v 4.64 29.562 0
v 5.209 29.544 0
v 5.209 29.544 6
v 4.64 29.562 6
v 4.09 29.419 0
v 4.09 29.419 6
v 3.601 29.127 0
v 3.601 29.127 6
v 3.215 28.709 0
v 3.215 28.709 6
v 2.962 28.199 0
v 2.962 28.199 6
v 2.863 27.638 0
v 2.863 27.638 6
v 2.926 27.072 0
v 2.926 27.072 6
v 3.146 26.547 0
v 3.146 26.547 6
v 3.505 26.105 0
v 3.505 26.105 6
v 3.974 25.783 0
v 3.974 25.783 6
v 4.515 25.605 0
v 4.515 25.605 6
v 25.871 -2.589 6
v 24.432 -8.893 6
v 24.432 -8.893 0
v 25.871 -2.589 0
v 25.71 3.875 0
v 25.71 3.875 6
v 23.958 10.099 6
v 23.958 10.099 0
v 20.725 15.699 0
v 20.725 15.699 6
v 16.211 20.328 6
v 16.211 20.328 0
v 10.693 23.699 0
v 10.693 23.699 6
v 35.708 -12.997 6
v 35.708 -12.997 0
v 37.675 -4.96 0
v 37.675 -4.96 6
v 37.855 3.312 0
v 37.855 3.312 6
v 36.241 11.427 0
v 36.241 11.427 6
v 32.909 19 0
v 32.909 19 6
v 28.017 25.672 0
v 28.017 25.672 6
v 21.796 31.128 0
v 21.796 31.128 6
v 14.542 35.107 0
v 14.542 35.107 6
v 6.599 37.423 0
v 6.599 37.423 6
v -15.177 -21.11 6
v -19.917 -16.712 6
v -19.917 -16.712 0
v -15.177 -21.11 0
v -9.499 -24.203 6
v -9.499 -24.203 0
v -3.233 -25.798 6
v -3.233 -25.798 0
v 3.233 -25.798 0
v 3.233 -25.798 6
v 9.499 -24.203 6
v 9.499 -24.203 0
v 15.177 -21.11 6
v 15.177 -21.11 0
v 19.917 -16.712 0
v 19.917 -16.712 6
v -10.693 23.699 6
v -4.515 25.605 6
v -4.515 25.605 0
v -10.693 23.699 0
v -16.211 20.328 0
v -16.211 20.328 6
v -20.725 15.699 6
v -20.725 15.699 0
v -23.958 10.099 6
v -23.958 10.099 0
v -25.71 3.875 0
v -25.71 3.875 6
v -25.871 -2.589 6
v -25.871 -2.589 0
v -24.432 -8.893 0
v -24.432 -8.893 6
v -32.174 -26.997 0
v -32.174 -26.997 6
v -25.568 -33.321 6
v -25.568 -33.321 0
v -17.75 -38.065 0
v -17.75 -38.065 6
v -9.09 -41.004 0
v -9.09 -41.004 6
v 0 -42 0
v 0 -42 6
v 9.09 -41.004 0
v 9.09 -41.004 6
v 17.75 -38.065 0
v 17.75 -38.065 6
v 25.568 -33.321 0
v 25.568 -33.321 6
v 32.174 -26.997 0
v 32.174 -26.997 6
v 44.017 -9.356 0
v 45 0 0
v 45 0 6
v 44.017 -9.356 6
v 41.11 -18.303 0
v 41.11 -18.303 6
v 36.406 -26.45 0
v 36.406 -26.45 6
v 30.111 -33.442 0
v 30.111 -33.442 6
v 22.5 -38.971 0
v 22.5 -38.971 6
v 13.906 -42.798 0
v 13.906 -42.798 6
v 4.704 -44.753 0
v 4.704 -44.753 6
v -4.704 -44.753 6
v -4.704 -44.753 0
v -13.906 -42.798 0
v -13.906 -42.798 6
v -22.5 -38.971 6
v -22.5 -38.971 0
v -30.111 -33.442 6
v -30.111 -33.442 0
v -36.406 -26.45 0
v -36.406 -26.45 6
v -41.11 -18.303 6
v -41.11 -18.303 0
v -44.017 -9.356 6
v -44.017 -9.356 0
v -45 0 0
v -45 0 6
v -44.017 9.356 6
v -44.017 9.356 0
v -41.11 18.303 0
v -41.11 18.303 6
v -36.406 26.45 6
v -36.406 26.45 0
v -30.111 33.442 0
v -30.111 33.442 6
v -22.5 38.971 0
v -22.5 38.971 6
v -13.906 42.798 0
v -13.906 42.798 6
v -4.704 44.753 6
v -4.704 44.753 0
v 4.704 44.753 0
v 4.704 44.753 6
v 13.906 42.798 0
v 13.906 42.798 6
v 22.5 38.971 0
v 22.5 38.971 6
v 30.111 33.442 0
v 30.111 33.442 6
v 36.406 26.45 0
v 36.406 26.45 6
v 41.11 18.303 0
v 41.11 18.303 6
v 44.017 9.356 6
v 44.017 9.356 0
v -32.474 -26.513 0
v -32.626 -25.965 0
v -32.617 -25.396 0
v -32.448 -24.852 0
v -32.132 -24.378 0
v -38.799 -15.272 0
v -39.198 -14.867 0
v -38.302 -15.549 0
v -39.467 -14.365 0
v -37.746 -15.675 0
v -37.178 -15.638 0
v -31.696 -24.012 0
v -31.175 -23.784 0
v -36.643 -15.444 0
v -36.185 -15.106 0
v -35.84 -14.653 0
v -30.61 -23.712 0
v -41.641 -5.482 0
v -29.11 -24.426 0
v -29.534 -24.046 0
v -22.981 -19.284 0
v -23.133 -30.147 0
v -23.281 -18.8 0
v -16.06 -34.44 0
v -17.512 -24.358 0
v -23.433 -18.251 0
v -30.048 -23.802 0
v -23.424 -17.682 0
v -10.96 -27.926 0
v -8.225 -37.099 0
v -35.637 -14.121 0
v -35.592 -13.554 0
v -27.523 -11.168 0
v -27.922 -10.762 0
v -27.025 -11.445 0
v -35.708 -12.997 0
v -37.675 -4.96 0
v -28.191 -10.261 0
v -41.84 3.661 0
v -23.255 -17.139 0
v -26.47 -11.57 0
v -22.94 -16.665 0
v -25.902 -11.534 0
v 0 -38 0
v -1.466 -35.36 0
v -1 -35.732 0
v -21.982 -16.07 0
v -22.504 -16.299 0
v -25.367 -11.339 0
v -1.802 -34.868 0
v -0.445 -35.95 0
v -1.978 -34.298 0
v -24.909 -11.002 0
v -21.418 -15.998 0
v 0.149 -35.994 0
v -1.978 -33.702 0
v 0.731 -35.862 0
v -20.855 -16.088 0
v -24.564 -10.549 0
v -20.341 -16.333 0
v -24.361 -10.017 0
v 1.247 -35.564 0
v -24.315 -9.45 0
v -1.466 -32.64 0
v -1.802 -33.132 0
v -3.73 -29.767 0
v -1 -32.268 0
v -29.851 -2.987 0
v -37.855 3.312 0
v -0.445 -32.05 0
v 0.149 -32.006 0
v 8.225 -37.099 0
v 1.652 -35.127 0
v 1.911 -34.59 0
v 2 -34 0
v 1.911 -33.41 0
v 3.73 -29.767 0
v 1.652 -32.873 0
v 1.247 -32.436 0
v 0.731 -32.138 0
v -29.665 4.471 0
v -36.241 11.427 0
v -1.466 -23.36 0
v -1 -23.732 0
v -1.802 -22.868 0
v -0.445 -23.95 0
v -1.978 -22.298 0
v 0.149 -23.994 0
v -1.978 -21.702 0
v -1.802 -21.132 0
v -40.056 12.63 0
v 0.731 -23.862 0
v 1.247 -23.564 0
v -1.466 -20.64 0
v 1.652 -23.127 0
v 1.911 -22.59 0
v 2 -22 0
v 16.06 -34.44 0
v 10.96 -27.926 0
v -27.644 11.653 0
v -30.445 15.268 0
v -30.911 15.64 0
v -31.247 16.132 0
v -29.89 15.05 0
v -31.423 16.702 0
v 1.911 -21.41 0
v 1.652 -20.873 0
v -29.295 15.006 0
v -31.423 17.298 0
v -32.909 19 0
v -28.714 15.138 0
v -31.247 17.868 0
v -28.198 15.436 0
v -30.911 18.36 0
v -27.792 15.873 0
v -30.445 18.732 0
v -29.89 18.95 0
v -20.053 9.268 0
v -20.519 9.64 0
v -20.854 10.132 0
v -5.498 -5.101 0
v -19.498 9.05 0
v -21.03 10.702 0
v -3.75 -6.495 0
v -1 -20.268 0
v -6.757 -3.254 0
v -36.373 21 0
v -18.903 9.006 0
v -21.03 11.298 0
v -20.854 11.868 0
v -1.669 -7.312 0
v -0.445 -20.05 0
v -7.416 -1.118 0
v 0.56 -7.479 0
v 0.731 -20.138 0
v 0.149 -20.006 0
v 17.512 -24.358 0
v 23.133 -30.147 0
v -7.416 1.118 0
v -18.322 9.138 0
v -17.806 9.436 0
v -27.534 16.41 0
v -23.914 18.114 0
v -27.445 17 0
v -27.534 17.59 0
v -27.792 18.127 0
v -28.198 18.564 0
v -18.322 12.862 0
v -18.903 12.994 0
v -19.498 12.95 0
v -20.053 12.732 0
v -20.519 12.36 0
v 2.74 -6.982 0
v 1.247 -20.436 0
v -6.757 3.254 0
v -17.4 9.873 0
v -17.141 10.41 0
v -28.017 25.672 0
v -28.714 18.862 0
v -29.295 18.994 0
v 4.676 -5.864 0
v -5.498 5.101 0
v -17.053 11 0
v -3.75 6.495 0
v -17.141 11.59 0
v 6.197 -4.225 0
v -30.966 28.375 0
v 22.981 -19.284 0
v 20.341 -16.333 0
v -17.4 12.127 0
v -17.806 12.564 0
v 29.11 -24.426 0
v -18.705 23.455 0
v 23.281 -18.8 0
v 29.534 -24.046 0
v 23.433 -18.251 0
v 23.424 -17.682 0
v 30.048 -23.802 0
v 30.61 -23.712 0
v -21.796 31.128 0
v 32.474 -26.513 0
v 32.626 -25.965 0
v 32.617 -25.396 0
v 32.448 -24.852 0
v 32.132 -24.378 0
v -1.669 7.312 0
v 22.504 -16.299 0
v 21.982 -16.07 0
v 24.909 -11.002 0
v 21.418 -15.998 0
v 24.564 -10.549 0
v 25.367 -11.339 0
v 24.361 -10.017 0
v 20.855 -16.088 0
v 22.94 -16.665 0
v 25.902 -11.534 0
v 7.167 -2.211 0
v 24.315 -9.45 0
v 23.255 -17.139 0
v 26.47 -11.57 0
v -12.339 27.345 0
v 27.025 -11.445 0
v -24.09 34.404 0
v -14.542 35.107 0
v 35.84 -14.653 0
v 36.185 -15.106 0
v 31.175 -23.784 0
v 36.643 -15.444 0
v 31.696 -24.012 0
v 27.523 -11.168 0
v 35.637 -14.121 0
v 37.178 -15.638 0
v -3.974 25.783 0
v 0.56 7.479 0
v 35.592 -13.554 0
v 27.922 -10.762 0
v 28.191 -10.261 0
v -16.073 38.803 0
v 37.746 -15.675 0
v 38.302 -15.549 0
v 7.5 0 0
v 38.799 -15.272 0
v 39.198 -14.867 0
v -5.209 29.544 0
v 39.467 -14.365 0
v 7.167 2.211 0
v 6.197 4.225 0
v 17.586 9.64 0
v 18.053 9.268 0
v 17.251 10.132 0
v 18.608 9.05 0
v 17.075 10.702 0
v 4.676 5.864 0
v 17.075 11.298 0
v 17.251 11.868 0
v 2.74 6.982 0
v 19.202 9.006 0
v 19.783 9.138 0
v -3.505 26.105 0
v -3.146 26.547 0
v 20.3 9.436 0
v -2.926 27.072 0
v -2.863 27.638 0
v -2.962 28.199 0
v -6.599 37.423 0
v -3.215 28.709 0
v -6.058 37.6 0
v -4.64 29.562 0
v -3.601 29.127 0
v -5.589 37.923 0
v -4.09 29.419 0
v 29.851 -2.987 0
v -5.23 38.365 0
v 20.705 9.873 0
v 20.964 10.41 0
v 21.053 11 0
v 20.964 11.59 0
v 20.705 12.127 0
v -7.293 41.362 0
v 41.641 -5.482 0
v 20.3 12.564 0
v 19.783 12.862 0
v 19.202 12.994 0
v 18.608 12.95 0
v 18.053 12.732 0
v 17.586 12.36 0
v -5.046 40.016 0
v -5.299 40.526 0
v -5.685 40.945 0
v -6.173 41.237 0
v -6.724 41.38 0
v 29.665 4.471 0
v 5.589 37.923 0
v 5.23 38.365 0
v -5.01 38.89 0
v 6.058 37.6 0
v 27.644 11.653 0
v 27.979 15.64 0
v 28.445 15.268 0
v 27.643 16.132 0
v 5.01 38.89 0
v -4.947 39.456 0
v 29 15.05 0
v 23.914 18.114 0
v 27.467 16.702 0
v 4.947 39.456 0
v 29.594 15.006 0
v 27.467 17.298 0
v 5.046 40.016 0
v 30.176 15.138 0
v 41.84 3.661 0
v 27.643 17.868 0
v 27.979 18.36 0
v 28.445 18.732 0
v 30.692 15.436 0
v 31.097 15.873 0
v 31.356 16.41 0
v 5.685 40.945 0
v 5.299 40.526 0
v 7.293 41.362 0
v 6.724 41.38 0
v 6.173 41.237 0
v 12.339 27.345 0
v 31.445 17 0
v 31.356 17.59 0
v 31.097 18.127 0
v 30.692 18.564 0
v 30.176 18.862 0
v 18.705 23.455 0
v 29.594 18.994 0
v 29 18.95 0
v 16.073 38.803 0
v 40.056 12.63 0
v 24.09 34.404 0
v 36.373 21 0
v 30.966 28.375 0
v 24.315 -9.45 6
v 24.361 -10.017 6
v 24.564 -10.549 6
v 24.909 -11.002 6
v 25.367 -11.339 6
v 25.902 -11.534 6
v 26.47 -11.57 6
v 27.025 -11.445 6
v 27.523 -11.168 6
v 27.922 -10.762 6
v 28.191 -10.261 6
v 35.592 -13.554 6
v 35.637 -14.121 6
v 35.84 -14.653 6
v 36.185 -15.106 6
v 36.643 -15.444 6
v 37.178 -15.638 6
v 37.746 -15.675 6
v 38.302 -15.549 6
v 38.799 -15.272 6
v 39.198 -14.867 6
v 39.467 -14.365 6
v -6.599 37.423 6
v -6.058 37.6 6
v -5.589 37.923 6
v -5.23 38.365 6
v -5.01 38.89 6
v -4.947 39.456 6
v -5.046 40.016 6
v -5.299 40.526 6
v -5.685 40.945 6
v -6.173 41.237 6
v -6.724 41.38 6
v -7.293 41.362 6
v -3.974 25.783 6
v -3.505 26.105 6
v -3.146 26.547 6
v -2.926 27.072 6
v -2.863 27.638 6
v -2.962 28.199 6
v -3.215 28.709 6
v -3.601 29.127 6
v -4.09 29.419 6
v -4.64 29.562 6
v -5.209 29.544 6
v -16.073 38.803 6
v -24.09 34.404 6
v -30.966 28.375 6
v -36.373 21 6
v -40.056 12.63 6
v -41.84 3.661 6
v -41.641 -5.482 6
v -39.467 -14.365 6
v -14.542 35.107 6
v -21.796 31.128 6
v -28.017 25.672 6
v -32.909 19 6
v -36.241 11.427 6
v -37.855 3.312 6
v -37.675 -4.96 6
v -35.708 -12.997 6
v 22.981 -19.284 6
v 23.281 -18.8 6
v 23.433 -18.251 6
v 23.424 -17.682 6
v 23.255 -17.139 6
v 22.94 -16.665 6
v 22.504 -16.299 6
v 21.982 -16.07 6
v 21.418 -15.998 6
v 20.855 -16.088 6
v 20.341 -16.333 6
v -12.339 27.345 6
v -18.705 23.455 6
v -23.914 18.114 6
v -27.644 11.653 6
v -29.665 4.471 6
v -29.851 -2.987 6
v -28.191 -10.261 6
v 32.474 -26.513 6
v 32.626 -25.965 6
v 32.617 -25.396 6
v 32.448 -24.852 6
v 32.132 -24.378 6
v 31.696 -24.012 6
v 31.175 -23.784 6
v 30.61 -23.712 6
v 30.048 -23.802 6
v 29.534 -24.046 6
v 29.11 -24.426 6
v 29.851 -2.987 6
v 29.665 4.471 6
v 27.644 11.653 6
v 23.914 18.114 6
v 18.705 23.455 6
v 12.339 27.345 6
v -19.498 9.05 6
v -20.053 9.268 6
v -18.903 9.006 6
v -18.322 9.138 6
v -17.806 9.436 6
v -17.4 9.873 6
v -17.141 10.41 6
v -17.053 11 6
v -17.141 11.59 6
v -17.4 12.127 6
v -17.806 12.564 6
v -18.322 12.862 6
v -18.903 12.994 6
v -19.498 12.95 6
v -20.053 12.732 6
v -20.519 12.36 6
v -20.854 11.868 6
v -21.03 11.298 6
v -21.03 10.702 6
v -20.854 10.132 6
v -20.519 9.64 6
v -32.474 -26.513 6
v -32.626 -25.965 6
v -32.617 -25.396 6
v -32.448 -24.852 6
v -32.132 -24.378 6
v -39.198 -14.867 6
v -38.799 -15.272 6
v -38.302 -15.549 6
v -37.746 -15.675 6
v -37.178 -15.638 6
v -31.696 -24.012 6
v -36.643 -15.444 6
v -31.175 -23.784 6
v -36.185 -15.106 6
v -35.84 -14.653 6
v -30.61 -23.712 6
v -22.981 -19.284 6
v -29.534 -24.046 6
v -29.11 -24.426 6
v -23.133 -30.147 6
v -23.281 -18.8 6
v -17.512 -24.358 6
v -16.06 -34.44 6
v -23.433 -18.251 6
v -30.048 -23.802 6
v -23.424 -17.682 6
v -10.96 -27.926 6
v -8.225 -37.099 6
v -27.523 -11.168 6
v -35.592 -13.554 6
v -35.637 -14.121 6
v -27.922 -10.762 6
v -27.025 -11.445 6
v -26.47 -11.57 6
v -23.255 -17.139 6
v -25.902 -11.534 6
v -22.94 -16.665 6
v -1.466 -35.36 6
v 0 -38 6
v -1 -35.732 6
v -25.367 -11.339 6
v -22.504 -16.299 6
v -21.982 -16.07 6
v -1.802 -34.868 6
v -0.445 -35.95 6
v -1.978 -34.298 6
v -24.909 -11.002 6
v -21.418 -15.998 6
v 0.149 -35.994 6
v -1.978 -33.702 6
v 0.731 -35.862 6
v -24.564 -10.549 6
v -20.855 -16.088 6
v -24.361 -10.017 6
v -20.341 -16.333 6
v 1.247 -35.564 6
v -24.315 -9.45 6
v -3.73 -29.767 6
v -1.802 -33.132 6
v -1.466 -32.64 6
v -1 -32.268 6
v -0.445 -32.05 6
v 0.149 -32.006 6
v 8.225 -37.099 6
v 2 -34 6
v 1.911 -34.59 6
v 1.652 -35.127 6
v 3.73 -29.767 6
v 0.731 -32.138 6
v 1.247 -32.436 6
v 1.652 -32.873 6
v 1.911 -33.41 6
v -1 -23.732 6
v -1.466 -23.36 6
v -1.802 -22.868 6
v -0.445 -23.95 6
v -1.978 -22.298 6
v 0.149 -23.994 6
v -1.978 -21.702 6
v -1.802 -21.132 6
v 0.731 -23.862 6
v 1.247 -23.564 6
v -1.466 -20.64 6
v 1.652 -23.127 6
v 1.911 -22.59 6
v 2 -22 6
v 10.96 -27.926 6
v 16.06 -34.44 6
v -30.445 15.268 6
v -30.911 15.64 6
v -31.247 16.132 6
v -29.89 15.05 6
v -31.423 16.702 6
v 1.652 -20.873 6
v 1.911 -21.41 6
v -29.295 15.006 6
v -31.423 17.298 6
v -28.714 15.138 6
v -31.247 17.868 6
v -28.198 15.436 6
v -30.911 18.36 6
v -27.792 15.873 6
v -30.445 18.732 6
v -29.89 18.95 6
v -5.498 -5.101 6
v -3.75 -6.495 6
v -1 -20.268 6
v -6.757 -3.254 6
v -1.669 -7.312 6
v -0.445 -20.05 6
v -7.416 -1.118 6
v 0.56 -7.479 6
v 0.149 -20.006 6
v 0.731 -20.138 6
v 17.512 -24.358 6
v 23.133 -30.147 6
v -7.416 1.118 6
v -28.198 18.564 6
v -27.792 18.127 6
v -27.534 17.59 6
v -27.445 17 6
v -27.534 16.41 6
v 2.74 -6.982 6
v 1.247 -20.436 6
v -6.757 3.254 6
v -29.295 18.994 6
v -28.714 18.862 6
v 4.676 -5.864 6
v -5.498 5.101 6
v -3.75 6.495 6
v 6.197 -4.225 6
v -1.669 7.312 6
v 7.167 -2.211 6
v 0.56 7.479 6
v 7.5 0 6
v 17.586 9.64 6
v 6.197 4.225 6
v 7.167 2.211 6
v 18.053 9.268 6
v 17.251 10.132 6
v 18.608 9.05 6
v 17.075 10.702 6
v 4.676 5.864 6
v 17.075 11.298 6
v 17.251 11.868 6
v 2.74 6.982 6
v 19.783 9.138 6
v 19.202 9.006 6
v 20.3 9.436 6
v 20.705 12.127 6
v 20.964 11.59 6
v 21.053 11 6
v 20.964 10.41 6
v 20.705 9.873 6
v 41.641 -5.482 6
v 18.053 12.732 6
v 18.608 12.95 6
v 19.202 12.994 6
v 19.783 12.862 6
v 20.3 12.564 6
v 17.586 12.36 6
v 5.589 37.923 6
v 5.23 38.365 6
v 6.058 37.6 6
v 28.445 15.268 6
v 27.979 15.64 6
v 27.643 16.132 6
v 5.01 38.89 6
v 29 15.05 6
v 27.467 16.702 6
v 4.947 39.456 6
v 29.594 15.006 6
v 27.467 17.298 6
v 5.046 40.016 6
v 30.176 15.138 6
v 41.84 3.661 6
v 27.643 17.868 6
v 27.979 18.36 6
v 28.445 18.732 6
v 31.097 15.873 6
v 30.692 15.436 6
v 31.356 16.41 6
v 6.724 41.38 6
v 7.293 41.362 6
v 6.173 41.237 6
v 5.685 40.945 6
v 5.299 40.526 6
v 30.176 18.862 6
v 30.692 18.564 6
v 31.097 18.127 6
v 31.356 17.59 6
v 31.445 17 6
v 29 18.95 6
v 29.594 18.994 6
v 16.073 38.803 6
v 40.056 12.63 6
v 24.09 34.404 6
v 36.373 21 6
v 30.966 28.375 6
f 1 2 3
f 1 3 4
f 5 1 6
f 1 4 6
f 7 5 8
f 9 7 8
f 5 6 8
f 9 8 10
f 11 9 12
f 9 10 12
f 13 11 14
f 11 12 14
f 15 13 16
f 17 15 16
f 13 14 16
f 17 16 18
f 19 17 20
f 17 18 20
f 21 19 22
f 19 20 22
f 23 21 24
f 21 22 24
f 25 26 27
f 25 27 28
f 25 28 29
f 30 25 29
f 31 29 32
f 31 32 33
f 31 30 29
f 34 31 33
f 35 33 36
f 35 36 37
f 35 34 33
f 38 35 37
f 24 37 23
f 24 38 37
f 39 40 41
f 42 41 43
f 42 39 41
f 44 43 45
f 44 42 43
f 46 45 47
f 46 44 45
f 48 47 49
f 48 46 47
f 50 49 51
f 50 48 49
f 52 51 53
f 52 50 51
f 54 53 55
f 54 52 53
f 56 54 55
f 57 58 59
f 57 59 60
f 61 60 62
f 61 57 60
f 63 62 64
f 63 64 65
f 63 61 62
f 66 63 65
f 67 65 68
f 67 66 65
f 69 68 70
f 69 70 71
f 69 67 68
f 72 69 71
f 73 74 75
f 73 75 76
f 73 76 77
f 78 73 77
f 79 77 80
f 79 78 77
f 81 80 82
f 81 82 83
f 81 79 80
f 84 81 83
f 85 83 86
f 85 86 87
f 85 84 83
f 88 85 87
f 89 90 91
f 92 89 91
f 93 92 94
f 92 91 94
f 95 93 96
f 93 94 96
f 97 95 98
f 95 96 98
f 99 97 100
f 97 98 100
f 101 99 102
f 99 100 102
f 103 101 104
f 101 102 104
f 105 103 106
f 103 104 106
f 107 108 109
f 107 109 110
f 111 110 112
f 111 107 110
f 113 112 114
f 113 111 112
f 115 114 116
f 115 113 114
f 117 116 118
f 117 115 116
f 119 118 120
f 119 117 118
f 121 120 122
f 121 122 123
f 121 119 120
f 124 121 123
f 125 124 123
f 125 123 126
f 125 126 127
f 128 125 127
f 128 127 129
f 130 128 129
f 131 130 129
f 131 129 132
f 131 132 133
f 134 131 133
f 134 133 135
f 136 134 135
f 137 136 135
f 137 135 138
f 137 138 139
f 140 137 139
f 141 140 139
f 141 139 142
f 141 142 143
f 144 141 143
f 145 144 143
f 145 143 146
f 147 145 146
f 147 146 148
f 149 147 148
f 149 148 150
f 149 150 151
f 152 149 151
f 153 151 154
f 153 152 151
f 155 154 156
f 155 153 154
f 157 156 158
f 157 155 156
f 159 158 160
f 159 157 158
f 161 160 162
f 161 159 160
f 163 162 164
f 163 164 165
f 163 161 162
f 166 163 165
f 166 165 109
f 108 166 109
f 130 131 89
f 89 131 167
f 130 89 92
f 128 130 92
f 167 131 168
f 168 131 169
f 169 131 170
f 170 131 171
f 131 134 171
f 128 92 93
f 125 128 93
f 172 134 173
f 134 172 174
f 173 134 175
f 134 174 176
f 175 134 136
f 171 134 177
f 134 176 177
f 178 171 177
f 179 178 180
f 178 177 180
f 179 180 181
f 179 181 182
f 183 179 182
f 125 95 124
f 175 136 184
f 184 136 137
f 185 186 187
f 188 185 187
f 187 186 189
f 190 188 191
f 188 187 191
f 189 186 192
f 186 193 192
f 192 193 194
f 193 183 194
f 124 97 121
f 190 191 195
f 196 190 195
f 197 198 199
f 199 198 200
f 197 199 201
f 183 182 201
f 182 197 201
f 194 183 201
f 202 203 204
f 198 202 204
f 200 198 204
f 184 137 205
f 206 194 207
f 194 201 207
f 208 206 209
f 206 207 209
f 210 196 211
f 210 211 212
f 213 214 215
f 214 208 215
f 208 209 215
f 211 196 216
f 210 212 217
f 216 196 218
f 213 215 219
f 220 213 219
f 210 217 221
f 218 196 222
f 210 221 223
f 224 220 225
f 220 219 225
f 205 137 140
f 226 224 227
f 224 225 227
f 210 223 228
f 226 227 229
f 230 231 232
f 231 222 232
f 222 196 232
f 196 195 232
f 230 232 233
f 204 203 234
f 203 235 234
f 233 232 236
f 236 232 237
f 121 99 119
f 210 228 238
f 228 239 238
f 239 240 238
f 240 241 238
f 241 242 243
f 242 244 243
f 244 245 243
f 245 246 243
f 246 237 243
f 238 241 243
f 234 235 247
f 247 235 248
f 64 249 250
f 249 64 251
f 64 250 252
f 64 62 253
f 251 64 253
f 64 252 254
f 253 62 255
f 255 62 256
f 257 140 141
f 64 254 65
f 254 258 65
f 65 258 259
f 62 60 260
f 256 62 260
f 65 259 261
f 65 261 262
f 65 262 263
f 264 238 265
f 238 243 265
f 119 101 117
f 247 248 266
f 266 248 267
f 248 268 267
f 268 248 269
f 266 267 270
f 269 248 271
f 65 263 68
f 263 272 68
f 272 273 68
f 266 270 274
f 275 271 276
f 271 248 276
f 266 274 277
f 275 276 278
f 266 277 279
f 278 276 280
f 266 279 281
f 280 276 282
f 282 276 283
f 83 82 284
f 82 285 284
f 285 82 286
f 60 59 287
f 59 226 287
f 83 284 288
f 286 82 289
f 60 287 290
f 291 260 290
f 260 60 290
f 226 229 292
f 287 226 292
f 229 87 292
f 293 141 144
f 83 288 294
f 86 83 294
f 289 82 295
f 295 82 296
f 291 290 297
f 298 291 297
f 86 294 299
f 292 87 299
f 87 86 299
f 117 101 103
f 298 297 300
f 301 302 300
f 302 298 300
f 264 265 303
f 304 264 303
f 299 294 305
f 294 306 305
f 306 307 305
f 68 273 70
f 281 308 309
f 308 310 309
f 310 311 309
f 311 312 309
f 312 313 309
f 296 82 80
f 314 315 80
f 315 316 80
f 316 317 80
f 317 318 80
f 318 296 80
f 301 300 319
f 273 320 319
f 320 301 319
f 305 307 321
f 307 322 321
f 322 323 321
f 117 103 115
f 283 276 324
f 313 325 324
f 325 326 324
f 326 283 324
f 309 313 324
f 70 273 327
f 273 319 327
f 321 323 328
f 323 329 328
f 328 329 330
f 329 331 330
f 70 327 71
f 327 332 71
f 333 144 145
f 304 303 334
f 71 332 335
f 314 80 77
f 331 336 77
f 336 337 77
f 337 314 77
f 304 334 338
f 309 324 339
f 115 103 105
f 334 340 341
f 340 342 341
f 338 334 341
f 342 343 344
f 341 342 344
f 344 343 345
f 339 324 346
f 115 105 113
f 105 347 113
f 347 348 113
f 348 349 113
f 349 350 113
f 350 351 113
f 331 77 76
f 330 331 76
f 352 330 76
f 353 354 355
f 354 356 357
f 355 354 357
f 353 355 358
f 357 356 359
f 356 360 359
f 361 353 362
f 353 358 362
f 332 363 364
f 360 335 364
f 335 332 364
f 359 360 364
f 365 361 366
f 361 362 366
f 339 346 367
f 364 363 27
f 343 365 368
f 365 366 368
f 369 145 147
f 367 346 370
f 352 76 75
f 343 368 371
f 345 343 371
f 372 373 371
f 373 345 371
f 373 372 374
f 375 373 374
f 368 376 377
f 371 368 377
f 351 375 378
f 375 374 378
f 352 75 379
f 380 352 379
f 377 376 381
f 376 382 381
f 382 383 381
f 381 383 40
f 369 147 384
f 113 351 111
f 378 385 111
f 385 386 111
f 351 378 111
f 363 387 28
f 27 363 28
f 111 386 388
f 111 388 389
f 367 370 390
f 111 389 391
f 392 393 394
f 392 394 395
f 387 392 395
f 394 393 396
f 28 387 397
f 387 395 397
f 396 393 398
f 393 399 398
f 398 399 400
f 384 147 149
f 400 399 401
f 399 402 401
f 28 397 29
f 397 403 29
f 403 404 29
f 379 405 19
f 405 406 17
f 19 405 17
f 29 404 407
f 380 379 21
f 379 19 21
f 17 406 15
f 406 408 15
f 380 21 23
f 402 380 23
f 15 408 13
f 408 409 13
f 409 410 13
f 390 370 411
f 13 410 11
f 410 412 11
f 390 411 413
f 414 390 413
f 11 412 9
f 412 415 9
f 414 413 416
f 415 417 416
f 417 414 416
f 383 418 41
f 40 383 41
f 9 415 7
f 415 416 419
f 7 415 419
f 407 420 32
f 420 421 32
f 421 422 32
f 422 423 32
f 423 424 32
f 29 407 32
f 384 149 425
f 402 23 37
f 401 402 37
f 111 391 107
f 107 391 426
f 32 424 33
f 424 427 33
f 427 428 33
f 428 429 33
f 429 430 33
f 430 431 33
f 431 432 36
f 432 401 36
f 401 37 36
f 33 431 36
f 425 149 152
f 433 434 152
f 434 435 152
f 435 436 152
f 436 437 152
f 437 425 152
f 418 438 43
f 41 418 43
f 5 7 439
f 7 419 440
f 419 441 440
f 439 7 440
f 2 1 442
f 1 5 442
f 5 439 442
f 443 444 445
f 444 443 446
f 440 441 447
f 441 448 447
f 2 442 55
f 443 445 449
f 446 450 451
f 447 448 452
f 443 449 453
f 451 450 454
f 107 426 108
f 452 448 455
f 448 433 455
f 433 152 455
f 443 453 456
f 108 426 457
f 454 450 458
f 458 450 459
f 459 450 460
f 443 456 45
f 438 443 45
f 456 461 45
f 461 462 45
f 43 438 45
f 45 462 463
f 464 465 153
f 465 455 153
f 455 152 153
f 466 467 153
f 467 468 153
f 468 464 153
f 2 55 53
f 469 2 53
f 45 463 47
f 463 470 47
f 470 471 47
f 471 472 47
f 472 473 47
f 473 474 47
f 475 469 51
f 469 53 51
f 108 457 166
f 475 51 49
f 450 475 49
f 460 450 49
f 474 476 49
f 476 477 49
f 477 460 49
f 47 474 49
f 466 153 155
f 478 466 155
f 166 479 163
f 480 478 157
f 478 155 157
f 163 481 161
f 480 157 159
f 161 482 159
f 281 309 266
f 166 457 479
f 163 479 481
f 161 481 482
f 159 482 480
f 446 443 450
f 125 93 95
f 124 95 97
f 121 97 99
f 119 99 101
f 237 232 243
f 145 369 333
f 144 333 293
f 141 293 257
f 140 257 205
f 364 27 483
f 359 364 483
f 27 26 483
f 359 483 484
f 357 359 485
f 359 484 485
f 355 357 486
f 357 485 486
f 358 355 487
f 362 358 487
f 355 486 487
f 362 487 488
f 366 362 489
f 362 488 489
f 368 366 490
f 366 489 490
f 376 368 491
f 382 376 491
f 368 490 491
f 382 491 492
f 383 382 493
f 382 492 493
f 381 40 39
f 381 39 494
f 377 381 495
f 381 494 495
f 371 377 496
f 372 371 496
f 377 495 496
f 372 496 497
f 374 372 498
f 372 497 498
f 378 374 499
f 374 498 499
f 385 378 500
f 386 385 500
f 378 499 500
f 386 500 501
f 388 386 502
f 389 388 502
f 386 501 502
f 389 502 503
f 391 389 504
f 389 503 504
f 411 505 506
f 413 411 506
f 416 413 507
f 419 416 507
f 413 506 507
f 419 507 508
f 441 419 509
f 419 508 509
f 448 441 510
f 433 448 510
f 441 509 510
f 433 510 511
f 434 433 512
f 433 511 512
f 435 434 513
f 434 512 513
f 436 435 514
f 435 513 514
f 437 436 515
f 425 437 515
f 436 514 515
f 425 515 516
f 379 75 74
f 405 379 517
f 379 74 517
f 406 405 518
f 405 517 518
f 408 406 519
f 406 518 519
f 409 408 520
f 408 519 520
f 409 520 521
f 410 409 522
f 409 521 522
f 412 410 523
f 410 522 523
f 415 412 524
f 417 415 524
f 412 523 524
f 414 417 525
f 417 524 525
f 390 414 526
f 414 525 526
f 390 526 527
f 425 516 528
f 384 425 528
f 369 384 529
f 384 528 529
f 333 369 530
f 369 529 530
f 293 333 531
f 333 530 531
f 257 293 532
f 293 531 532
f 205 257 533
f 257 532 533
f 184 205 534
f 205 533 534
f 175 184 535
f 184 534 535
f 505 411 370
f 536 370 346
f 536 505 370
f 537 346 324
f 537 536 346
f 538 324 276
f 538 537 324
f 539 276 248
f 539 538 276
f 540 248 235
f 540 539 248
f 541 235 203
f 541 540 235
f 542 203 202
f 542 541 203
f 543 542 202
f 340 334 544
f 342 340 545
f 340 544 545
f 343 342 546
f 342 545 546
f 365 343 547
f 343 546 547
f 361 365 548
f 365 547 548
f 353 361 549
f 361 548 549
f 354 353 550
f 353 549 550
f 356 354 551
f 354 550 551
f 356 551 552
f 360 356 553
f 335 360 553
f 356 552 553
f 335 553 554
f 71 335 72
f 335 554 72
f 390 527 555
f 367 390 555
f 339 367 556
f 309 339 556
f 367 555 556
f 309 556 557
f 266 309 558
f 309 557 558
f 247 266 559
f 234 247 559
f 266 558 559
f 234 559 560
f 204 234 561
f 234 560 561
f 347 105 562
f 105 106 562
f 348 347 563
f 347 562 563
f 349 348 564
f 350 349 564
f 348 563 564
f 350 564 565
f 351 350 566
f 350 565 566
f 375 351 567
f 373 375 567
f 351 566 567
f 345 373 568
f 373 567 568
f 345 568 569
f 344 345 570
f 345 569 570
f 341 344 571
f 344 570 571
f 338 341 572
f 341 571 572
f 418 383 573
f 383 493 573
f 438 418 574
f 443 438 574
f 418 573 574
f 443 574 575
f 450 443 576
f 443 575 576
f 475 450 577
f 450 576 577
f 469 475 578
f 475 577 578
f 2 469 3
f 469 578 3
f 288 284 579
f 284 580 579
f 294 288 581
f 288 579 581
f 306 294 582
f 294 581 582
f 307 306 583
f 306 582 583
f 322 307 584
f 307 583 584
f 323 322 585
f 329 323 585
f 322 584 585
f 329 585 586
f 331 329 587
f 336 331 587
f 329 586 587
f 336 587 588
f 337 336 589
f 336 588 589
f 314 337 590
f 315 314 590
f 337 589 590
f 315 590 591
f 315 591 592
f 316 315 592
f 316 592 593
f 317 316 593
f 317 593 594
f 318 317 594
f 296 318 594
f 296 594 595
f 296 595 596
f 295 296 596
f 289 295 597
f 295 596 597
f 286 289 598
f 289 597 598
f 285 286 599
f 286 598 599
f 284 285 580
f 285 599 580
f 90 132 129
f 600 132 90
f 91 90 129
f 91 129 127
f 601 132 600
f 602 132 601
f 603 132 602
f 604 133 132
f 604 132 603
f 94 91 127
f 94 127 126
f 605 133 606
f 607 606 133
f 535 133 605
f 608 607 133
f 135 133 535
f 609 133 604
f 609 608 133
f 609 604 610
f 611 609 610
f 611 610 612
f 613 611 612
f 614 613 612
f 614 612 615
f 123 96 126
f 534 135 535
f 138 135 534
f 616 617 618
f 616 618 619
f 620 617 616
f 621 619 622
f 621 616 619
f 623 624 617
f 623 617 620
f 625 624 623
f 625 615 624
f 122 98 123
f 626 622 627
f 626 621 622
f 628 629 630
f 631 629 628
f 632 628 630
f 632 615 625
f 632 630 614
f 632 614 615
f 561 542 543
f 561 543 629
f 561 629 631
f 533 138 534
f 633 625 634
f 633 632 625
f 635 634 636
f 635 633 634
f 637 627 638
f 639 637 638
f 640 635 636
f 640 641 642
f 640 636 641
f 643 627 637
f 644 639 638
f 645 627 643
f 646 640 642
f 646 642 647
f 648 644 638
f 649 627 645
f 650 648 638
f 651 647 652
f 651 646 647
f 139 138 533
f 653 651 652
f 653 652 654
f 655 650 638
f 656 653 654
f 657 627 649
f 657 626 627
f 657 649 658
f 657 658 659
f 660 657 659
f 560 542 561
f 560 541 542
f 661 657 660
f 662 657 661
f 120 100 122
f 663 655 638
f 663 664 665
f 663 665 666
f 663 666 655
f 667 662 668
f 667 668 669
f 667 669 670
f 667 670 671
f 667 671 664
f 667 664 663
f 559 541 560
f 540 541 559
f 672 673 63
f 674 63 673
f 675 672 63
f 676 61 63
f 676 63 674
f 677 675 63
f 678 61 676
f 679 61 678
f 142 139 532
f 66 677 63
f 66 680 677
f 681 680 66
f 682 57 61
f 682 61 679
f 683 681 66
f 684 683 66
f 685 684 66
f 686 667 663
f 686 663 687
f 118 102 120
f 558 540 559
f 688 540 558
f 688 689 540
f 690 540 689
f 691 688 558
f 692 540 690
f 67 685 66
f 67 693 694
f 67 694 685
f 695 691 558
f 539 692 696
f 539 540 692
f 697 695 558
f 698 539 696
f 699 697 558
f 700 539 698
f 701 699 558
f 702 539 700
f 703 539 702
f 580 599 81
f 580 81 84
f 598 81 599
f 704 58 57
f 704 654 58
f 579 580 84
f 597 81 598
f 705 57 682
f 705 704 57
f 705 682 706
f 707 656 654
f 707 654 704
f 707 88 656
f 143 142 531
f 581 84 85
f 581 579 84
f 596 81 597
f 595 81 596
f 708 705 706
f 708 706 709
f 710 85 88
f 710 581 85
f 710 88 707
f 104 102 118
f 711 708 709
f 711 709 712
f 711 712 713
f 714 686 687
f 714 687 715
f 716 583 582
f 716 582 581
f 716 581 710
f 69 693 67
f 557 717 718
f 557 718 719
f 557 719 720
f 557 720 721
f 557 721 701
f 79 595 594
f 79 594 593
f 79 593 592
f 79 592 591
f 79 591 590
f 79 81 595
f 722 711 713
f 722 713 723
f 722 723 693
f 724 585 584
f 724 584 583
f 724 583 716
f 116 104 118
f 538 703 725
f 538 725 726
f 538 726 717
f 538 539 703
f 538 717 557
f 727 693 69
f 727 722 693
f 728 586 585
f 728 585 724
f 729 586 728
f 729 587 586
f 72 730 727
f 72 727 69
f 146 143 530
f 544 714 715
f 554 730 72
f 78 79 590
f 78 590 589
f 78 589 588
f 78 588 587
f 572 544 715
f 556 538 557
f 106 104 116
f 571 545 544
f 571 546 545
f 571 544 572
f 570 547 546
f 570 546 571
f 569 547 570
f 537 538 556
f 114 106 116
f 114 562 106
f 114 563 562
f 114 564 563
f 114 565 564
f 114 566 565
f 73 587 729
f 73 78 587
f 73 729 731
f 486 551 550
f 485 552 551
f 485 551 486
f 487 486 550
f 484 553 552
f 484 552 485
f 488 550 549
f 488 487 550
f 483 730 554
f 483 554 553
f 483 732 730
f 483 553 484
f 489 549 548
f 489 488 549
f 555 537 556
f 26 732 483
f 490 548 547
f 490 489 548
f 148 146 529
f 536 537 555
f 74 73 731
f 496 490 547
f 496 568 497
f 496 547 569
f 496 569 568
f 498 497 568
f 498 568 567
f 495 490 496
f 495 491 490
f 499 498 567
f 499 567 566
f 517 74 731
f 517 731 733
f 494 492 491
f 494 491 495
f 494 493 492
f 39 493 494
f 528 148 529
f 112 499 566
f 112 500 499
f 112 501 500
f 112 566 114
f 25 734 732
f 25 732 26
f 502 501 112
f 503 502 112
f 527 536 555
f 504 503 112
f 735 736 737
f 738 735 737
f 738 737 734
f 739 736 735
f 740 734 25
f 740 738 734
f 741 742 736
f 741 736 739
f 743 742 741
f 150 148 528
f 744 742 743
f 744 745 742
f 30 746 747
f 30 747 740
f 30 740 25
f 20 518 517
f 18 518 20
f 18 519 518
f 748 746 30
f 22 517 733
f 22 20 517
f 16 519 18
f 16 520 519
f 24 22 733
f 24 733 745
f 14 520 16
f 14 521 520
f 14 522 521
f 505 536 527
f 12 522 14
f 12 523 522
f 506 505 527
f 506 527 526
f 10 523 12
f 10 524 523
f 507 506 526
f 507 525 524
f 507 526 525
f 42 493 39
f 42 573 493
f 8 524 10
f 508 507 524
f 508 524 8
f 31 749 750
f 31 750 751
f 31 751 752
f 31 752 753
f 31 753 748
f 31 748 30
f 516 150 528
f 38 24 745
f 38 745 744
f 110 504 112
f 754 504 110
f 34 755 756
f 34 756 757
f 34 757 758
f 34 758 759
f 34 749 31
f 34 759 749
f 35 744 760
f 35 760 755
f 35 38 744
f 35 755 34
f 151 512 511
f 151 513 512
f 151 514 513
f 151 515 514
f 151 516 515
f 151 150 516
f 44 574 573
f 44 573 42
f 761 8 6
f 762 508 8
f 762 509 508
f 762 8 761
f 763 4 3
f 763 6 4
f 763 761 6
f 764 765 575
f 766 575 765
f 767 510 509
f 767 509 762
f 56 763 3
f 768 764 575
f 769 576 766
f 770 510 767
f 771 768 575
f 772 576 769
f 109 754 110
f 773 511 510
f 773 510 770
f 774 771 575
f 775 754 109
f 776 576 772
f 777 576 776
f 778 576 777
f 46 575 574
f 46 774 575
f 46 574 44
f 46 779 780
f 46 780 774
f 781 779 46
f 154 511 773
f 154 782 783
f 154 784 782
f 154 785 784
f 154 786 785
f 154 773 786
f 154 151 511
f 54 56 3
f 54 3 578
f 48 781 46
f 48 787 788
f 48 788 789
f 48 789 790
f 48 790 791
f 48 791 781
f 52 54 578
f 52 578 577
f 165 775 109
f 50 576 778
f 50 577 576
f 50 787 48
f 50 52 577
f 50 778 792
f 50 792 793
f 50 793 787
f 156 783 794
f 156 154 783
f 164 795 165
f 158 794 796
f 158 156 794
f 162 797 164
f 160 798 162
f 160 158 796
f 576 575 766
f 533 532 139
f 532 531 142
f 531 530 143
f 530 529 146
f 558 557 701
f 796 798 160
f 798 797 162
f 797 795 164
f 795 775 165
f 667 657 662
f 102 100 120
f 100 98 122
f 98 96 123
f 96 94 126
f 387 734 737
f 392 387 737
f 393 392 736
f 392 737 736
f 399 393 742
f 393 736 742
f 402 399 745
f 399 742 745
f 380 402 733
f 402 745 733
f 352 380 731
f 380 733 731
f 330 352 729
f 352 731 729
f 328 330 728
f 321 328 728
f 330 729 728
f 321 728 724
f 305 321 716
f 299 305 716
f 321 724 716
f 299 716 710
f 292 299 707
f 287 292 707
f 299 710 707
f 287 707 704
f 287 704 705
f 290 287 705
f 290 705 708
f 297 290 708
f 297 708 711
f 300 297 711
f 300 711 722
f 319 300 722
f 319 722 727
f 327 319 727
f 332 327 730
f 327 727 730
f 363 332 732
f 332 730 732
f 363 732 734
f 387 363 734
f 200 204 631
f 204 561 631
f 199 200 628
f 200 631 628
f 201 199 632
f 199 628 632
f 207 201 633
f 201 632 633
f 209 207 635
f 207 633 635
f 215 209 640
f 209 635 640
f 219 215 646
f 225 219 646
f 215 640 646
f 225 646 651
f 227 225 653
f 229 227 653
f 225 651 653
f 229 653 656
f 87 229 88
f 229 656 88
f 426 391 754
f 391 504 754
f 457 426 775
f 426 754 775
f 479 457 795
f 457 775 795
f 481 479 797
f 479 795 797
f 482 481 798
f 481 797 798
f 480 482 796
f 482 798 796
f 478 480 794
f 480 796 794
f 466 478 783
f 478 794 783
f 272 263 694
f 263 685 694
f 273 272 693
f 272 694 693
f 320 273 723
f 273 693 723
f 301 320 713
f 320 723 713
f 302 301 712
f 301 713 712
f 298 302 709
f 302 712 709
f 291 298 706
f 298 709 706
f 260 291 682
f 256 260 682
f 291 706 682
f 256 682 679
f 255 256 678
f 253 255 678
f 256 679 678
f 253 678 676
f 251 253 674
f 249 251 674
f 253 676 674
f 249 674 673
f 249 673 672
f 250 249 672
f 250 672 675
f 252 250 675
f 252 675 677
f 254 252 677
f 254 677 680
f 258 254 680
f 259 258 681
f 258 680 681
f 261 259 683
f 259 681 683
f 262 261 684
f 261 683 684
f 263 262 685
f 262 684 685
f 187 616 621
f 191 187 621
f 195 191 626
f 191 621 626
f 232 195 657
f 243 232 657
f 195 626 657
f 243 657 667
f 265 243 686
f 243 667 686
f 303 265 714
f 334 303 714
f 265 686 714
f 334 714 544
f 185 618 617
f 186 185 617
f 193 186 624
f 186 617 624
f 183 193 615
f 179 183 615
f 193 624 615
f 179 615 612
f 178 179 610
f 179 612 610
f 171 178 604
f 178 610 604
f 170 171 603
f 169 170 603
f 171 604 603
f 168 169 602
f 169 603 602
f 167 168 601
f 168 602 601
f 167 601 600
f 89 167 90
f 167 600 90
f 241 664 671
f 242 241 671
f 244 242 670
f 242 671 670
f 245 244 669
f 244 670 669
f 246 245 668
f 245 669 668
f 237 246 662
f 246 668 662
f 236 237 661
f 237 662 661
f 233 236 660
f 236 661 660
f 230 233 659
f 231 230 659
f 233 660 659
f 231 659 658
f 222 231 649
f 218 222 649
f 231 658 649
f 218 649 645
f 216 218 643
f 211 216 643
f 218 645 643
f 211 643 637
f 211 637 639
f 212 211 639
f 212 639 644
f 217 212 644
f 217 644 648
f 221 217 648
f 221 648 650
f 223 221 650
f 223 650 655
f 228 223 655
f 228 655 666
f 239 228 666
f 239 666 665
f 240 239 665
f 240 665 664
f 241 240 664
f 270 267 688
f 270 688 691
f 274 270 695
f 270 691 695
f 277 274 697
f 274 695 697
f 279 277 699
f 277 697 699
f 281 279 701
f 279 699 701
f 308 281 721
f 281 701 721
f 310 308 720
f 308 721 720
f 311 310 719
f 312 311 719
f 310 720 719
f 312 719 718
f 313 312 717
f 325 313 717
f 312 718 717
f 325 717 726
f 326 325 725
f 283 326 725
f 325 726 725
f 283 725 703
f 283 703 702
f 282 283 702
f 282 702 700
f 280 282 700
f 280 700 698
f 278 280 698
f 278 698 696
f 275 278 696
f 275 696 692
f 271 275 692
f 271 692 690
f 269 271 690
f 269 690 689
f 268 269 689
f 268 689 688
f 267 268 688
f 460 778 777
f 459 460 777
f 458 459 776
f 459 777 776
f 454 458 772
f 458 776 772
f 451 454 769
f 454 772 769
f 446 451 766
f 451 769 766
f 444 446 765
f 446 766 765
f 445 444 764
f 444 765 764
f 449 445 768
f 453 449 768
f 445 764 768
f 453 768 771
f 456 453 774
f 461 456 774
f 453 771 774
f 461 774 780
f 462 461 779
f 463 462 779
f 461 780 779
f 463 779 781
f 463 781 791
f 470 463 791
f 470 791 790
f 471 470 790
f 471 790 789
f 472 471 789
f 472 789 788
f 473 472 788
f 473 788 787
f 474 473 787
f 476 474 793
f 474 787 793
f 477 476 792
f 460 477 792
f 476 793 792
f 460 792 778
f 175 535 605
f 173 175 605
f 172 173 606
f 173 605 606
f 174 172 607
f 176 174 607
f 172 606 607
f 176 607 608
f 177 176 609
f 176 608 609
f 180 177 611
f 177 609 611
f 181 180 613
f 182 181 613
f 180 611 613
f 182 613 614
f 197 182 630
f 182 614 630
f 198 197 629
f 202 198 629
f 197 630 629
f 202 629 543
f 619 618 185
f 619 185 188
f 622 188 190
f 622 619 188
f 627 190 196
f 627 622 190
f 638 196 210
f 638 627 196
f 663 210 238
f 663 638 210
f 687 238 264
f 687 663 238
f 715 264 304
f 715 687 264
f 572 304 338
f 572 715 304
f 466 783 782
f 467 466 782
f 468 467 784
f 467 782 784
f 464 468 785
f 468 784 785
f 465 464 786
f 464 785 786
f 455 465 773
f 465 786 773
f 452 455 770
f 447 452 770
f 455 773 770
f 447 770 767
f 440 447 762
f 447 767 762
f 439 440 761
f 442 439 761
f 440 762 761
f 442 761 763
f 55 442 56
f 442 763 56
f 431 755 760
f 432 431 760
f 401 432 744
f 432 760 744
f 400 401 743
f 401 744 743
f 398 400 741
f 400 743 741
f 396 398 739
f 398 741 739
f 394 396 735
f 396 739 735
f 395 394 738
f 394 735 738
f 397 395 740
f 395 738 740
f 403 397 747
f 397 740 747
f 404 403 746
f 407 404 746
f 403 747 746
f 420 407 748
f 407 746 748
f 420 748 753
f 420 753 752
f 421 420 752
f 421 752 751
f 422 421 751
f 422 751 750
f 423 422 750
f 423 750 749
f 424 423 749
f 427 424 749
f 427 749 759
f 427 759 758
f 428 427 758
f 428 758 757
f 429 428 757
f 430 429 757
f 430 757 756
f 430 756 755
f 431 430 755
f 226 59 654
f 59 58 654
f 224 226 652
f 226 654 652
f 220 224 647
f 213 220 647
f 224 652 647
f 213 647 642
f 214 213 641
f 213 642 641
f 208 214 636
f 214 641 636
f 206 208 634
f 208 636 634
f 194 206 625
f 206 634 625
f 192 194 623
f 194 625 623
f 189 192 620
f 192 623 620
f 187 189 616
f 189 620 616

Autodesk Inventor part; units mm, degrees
ref_plane "YZ Plane" through (0, 0, 0) normal (1, 0, 0) x (0, 1, 0)
ref_plane "XZ Plane" through (0, 0, 0) normal (0, 1, 0) x (-1, 0, 0)
ref_plane "XY Plane" through (0, 0, 0) normal (0, 0, 1) x (1, 0, 0)
sketch "Sketch1" plane through (0, 0, 0) normal (0, 0, 1) x (1, 0, 0)
  line L0 (0, 63) -> (0, -63) projected
  line L1 (-63, 0) -> (63, 0) projected
  circle A0 centre (0, 0) radius 45
  dimension "d0" = 90
extrude "Extrusion1" add sketch "Sketch1" along normal blind 6
sketch "Sketch2" plane through (0, 0, 6) normal (0, 0, 1) x (1, 0, 0)
  circle A0 centre (0, 0) radius 7.5
  circle A1 centre (0, 0) radius 45 projected
  line L0 (0, 63) -> (0, -63) projected
  line L1 (-63, 0) -> (63, 0) projected
  arc A2 (-21.4492, -17.9981) -> (21.4492, -17.9981) centre (0, 0) ccw construction
  arc A3 (-22.9813, -19.2836) -> (22.9813, -19.2836) centre (0, 0) ccw
  arc A4 (-19.9172, -16.7125) -> (19.9172, -16.7125) centre (0, 0) ccw
  arc A5 (-19.9172, -16.7125) -> (-22.9813, -19.2836) centre (-21.4492, -17.9981) ccw
  arc A6 (22.9813, -19.2836) -> (19.9172, -16.7125) centre (21.4492, -17.9981) ccw
  line L2 (0, 0) -> (21.4492, -17.9981) construction
  line L3 (0, 0) -> (-21.4492, -17.9981) construction
  arc A7 (-30.6418, -25.7115) -> (30.6418, -25.7115) centre (0, 0) ccw construction
  arc A8 (-32.1739, -26.9971) -> (32.1739, -26.9971) centre (0, 0) ccw
  arc A9 (-29.1097, -24.4259) -> (29.1097, -24.4259) centre (0, 0) ccw
  arc A10 (-29.1097, -24.4259) -> (-32.1739, -26.9971) centre (-30.6418, -25.7115) ccw
  arc A11 (32.1739, -26.9971) -> (29.1097, -24.4259) centre (30.6418, -25.7115) ccw
  line L4 (0, 0) -> (30.6418, -25.7115) construction
  line L5 (0, 0) -> (-30.6418, -25.7115) construction
  circle A12 centre (0, -34) radius 2
  circle A13 centre (0, -22) radius 2
  dimension "d3" = 15
  dimension "d35" = 100
  dimension "d36" = 4
  dimension "d37" = 28
  dimension "d38" = 100
  dimension "d39" = 4
  dimension "d40" = 12
  dimension "d41" = 4
  dimension "d42" = 4
  dimension "d43" = 22
  dimension "d44" = 34
extrude "Extrusion2" cut sketch "Sketch2" against normal through all contours L1 L0 A0 | A0 L0 L1 | L0 L1 A0 | A0 L1 L0 | A13 L0 | L0 A13 | A8 A10 A9 L0 | L0 A9 A11 A8 | A4 A6 A3 L0 | L0 A3 A5 A4 | A12 L0 | L0 A12
pattern_circular "Circular Pattern2" count 3 over 360 about axis through (0, 0, 6) along (0, 0, -1) of "Extrusion2"
properties part number "WorkTriangleDisk"
